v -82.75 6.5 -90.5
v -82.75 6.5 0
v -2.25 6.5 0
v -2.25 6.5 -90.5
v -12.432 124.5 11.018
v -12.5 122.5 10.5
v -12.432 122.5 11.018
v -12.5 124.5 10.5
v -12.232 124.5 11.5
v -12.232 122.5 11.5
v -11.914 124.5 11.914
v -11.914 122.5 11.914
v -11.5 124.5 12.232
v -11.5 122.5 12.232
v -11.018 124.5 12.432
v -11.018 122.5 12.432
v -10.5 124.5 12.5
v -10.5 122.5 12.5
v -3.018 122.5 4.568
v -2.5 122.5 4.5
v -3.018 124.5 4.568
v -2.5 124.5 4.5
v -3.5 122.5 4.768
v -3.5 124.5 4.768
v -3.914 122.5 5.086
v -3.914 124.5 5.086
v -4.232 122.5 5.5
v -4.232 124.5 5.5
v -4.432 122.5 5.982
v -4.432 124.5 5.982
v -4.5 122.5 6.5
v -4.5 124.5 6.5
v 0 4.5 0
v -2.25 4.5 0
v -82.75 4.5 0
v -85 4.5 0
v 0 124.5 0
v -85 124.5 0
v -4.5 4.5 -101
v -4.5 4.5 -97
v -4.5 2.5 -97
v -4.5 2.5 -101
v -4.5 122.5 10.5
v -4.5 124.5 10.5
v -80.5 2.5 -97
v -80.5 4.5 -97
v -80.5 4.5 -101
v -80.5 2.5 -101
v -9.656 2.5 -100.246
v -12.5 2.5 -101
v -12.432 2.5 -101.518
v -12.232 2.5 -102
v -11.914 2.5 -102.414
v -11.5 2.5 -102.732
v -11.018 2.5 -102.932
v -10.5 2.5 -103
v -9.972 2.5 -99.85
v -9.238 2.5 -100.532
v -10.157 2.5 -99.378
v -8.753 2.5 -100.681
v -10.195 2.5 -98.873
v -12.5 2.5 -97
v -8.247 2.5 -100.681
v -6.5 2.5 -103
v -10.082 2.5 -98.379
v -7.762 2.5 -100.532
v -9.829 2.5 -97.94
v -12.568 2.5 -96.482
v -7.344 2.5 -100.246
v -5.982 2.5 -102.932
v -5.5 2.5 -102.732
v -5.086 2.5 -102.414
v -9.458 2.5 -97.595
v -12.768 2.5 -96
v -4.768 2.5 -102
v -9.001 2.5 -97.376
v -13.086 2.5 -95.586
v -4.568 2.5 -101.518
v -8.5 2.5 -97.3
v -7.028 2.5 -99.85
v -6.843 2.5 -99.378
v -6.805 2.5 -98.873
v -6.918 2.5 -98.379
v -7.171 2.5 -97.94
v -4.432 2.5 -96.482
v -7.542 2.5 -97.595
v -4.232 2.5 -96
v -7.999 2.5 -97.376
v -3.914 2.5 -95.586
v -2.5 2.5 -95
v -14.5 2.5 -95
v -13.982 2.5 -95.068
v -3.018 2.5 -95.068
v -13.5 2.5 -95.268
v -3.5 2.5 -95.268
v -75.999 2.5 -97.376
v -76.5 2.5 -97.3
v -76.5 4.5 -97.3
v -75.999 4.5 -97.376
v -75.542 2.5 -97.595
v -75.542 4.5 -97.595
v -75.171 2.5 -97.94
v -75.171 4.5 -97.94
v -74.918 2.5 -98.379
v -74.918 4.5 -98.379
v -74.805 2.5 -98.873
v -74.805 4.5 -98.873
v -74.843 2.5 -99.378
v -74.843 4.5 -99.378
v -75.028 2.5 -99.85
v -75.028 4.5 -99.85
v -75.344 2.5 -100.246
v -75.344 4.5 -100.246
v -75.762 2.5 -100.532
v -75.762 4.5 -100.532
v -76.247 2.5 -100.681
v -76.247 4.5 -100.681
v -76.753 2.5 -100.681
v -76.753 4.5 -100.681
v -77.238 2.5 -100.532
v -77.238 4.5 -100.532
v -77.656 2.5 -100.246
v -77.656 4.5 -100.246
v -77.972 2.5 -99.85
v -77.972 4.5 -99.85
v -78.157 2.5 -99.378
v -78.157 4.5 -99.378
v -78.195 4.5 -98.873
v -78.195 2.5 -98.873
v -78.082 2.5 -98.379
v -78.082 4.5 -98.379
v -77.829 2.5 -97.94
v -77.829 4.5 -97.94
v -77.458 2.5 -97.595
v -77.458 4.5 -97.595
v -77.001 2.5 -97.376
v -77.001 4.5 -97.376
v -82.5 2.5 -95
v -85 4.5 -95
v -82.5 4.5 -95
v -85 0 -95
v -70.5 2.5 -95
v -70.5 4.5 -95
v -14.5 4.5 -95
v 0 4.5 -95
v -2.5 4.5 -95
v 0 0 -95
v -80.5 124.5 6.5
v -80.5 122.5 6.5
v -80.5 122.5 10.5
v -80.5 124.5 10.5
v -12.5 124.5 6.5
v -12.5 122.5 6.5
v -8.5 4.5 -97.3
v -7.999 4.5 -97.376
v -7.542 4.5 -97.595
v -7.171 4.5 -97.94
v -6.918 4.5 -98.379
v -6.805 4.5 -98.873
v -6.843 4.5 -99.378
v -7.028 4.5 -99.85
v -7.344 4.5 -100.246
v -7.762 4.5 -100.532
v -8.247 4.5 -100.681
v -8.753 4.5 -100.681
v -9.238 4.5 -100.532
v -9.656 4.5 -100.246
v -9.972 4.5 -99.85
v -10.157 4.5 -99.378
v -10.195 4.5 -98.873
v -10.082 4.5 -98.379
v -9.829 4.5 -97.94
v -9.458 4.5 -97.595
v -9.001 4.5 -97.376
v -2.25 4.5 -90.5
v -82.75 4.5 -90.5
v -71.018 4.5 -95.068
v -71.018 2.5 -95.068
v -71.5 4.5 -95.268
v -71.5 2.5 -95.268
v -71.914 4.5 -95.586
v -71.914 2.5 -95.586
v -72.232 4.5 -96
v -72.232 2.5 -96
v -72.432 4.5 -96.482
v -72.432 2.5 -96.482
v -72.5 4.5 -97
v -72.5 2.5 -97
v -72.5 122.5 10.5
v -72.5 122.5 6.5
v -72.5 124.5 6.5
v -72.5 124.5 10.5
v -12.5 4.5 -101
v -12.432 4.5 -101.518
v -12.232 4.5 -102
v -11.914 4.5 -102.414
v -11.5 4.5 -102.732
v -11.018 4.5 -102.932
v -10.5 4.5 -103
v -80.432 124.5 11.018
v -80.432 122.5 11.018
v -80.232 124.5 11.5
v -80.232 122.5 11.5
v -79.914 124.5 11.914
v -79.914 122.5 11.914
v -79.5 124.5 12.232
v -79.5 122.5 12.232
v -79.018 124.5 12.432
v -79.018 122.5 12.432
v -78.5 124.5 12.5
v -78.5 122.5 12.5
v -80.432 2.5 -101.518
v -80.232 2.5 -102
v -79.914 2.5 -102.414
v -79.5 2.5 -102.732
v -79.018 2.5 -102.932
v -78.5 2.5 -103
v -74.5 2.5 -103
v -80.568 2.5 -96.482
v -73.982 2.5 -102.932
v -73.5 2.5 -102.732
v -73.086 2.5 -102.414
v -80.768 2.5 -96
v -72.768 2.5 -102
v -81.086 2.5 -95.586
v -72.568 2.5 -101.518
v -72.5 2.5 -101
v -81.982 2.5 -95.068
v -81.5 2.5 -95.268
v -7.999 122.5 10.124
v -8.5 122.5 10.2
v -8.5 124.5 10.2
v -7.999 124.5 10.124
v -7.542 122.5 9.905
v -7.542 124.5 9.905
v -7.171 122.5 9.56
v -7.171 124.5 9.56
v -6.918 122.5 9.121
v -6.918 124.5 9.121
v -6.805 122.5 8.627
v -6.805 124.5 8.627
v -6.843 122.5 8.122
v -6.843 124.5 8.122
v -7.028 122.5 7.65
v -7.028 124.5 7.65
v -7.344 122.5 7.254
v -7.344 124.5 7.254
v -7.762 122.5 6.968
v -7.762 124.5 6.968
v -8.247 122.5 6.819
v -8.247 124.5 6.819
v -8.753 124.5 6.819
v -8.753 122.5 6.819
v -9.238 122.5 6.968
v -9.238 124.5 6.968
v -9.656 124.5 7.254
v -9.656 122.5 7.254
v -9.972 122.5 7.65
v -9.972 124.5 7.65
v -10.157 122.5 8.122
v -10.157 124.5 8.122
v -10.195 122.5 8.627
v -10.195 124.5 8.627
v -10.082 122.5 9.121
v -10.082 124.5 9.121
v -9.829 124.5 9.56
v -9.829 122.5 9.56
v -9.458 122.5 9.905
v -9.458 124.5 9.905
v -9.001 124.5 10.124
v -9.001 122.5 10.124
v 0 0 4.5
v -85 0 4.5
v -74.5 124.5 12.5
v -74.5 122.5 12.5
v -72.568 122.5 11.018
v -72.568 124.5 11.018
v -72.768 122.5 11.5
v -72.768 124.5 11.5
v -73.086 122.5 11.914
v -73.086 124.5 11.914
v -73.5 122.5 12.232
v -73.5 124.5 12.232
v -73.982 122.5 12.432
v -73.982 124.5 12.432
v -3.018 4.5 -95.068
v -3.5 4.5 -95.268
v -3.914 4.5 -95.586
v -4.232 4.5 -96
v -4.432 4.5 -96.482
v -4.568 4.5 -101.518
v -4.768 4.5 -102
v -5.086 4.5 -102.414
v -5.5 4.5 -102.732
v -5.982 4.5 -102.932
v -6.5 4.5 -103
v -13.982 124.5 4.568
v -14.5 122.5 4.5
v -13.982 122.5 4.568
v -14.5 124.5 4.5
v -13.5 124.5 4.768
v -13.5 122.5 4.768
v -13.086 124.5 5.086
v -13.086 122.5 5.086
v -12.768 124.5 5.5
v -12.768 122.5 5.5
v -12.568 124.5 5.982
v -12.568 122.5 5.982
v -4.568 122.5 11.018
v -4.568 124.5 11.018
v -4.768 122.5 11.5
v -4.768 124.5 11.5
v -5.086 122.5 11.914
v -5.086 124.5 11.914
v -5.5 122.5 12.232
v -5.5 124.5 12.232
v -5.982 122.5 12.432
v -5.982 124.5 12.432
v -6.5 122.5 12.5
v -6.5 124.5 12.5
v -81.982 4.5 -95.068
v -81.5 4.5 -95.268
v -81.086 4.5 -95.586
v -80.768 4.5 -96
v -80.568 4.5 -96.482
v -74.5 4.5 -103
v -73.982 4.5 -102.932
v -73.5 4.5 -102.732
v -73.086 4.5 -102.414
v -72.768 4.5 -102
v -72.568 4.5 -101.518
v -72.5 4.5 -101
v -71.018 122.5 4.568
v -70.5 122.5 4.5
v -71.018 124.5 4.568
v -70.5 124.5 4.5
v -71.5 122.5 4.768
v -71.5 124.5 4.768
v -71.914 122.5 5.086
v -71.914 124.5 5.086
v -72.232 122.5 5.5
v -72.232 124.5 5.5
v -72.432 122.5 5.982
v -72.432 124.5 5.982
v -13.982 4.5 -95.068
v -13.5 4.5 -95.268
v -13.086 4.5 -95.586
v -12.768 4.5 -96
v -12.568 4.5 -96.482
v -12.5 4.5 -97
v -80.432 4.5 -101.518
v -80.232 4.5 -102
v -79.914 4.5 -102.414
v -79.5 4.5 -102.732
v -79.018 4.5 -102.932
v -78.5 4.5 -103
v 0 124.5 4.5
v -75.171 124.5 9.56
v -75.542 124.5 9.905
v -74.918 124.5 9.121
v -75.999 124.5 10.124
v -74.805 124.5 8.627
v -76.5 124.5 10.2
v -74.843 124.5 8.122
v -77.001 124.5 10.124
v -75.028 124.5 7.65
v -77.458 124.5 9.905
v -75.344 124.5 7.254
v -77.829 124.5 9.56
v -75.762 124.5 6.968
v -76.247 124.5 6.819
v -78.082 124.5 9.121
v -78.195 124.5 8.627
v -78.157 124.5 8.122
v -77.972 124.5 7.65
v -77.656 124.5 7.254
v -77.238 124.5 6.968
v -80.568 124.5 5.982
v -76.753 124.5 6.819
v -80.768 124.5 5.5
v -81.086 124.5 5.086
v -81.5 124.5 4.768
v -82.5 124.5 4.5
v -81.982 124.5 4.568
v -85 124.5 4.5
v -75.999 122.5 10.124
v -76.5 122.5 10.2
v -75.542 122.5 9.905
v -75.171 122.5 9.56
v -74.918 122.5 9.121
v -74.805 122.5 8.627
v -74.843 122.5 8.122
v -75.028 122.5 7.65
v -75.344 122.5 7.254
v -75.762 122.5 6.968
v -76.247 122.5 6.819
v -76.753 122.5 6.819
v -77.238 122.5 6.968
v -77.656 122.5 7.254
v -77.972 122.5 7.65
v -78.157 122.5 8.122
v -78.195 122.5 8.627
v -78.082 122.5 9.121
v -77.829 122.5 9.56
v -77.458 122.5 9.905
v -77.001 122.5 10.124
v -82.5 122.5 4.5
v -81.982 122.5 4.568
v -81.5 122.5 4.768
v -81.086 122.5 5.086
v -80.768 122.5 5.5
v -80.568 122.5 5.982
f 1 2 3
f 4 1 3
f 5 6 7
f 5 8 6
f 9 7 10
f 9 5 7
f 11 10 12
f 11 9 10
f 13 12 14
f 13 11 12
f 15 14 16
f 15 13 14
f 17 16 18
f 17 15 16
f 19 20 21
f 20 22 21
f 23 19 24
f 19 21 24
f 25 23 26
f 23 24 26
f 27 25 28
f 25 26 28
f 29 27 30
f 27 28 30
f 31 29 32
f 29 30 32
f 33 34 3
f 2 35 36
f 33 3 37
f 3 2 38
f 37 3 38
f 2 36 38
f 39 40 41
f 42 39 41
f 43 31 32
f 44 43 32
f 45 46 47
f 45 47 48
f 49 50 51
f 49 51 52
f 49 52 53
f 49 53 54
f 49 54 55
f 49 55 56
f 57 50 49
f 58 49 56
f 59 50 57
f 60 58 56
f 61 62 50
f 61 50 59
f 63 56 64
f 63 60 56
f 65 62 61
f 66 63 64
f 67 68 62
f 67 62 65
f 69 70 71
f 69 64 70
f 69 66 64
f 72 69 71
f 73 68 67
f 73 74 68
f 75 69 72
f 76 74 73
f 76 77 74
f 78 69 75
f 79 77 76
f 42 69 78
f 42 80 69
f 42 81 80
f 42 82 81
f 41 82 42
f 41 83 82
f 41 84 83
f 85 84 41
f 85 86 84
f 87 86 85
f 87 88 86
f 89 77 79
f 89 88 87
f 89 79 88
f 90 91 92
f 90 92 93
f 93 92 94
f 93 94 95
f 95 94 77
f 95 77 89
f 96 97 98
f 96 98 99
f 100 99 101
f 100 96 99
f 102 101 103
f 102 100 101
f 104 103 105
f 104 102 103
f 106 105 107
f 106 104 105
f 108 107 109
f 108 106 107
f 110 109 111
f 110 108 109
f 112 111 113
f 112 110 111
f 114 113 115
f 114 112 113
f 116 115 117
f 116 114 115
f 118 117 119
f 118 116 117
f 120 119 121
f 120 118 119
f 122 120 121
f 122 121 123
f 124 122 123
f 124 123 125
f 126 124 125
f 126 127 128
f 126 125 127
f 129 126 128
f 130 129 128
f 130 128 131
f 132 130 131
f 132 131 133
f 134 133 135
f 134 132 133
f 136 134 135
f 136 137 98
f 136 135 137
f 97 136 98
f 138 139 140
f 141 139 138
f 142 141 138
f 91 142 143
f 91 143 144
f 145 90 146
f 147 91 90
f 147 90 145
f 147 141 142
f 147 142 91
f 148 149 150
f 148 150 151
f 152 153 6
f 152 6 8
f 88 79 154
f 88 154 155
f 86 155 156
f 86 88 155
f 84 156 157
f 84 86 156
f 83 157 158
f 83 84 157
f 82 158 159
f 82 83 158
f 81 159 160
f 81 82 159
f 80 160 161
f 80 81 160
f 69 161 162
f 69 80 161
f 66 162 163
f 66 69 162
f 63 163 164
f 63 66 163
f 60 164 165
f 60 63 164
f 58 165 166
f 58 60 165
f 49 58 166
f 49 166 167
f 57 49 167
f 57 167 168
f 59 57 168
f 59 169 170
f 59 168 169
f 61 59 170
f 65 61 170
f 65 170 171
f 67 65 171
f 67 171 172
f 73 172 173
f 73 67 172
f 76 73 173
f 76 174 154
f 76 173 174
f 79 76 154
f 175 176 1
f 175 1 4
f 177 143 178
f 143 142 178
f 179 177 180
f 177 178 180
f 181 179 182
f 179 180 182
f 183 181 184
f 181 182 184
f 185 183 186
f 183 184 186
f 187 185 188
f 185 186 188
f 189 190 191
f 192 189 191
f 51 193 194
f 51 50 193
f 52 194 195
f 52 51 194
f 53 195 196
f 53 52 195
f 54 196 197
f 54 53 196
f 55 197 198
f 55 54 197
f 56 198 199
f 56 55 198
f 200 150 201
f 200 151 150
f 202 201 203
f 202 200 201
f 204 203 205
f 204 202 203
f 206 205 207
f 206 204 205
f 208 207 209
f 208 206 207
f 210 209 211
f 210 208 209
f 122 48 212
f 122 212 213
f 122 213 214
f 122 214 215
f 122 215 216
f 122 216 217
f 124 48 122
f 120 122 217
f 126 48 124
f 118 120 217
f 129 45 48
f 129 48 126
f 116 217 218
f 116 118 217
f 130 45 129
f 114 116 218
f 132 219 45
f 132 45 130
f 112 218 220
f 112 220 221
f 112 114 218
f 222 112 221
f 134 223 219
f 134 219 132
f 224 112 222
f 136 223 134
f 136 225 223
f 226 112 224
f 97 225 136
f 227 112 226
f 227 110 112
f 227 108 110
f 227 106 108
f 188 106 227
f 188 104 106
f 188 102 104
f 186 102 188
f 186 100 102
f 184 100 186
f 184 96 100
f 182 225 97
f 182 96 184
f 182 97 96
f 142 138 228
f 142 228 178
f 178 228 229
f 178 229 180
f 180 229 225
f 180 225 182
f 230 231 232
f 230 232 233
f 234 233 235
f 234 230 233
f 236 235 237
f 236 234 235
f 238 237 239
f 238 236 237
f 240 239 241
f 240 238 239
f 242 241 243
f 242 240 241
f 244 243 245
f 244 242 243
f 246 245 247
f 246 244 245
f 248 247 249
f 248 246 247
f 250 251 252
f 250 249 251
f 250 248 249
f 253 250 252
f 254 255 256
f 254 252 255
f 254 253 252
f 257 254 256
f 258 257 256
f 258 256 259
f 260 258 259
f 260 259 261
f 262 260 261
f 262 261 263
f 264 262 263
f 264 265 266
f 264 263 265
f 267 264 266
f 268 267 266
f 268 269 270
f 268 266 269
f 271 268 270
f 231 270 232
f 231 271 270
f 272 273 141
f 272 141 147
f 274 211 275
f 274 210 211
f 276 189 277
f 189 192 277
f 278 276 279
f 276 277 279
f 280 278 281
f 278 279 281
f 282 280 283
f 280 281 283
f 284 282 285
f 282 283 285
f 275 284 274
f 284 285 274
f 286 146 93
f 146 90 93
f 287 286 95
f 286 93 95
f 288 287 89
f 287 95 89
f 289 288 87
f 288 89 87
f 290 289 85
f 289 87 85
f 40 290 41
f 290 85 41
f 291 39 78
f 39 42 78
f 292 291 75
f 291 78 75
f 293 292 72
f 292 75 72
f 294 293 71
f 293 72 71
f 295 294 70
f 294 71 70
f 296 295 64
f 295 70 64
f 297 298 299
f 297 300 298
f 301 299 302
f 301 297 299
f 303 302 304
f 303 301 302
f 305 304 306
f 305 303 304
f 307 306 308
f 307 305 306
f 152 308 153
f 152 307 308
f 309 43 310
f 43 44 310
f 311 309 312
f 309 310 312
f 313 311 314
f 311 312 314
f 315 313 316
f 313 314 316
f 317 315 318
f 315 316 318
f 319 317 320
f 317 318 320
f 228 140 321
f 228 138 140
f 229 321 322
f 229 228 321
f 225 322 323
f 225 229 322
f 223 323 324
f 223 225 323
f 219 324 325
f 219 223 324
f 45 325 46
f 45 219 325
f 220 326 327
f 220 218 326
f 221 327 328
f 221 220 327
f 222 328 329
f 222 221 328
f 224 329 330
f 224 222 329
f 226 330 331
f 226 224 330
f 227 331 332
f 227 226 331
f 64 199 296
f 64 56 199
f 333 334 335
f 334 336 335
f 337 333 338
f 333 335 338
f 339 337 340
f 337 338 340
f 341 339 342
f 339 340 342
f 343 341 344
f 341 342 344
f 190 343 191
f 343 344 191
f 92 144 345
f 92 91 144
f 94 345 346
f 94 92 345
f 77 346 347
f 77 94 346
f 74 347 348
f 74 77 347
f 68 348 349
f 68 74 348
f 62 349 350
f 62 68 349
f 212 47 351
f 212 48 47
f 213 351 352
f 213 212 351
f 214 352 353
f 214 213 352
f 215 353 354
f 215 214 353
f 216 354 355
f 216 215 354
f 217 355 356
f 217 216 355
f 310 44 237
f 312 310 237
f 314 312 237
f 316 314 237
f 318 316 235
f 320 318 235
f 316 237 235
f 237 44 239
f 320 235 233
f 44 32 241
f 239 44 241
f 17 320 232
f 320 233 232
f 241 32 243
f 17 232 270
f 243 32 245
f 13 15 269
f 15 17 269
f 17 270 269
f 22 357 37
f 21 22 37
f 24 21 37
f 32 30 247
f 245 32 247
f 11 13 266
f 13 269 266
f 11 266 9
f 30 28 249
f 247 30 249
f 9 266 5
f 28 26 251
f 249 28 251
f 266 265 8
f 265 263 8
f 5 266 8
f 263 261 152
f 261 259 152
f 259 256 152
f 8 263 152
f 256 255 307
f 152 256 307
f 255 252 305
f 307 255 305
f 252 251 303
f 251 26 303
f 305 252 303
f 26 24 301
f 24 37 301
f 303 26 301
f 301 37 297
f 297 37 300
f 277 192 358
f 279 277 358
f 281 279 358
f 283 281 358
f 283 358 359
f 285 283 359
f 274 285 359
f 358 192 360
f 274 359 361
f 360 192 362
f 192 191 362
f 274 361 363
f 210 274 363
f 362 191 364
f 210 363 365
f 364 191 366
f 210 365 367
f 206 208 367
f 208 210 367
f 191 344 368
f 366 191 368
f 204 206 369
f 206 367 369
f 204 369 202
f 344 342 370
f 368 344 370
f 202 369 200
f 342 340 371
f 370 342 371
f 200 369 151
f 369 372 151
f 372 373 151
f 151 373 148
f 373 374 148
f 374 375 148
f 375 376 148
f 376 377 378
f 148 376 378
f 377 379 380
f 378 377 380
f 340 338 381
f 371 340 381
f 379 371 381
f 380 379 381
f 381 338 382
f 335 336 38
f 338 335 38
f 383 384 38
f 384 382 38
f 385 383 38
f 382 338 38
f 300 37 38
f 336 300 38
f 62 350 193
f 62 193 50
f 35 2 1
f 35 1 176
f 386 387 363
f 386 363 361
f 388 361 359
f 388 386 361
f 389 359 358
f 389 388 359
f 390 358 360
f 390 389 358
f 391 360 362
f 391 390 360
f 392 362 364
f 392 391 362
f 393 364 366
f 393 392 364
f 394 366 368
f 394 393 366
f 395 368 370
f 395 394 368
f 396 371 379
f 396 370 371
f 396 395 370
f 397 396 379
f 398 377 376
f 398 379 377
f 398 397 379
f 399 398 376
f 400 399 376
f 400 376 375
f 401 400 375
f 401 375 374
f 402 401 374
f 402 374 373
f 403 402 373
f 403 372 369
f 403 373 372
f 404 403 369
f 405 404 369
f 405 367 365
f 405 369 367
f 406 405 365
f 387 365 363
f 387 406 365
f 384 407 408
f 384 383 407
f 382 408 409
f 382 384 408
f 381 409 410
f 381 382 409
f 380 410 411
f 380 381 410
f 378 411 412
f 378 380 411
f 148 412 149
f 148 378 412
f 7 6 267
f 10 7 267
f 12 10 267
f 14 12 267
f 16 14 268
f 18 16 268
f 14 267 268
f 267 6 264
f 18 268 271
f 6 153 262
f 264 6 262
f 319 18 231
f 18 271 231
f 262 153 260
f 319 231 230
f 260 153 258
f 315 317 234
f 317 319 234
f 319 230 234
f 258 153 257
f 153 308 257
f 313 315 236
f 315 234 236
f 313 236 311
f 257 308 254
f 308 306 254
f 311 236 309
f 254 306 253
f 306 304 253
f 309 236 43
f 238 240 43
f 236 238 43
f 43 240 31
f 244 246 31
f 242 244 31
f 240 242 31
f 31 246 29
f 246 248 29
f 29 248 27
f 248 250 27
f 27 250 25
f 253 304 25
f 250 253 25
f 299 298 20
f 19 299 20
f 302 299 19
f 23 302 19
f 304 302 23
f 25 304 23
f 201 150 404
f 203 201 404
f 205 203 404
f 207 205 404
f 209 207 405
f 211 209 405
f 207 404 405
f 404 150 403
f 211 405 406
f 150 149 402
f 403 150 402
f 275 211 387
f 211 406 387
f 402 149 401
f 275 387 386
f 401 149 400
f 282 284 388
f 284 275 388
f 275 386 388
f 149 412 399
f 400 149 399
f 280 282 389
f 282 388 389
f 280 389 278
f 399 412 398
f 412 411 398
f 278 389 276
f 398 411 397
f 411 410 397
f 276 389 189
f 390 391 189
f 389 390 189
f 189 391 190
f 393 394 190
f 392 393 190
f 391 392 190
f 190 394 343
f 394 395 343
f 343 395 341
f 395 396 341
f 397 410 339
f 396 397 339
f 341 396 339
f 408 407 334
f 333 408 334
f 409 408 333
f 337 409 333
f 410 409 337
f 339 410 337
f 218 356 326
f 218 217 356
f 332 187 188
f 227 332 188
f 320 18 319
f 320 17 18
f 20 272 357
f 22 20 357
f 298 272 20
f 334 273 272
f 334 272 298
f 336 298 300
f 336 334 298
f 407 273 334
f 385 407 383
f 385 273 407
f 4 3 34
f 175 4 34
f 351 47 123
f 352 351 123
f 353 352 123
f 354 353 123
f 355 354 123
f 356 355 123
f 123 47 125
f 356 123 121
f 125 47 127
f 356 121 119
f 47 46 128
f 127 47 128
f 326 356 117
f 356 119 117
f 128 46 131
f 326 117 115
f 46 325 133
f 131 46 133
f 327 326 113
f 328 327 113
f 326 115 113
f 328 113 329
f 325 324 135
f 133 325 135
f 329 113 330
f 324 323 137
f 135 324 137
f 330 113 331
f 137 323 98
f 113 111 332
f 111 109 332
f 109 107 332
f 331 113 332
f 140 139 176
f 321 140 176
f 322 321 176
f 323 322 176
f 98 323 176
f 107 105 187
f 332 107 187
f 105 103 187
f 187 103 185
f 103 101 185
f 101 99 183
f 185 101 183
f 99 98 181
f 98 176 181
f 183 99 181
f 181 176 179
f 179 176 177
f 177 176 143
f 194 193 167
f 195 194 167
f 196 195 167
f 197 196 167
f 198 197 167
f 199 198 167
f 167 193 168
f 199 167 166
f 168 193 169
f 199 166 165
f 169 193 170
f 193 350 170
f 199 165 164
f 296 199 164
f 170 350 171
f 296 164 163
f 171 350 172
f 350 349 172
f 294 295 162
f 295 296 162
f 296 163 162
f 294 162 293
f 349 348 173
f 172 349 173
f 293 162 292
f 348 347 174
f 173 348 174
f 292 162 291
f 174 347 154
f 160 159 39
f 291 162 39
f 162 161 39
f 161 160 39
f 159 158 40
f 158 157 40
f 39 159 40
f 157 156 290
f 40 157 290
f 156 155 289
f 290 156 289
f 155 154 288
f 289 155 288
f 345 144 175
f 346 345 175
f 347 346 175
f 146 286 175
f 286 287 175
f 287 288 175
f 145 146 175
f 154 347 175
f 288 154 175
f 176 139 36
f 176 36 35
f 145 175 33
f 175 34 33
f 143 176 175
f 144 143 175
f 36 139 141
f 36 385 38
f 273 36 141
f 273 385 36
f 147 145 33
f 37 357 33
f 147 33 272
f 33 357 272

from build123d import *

# Parameters (mm, degrees)
SKETCH1_W               = 124.5
SKETCH1_H               = 85
BOSS_EXTRUDE1_DEPTH     = 4.5
SKETCH2_W               = 85
SKETCH2_H               = 4.5
BOSS_EXTRUDE2_DEPTH     = 95
SKETCH3_W               = 80.5
SKETCH3_H               = 2
BOSS_EXTRUDE3_DEPTH     = 90.5
SKETCH4_W               = 8
SKETCH4_H               = 2
BOSS_EXTRUDE4_DEPTH     = 8
SKETCH5_W               = 8
SKETCH5_H               = 2
BOSS_EXTRUDE5_DEPTH     = 8
CUT_EXTRUDE1_DEPTH      = 183.576696213
CUT_EXTRUDE1_DEPTH_BACK = 183.576696213
SKETCH6_R               = 1.7
FILLET1_R               = 2


with BuildPart() as part:
    # Sketch1 → Boss-Extrude1 (new body)
    with BuildSketch(Plane(origin=(0, 0, 0), x_dir=(0, 1, 0), z_dir=(0, 0, 1))):
        with Locations((62.25, 42.5)):
            Rectangle(SKETCH1_W, SKETCH1_H)
    extrude(amount=BOSS_EXTRUDE1_DEPTH)

    # Sketch2 → Boss-Extrude2 (add)
    with BuildSketch(Plane(origin=(0, 0, 0), x_dir=(1, 0, 0), z_dir=(0, 0, -1))):
        with Locations((-42.5, -2.25)):
            Rectangle(SKETCH2_W, SKETCH2_H)
    extrude(amount=BOSS_EXTRUDE2_DEPTH)

    # Sketch3 → Boss-Extrude3 (add)
    with BuildSketch(Plane(origin=(0, 0, 0), x_dir=(1, 0, 0), z_dir=(0, 0, -1))):
        with Locations((-42.5, -5.5)):
            Rectangle(SKETCH3_W, SKETCH3_H)
    extrude(amount=BOSS_EXTRUDE3_DEPTH)

    # Sketch4 → Boss-Extrude4 (add)
    with BuildSketch(Plane.XY.offset(4.5)):
        with Locations((-76.5, 123.5)):
            Rectangle(SKETCH4_W, SKETCH4_H)
        with Locations((-8.5, 123.5)):
            Rectangle(SKETCH4_W, SKETCH4_H)
    extrude(amount=BOSS_EXTRUDE4_DEPTH)

    # Sketch5 → Boss-Extrude5 (add)
    with BuildSketch(Plane(origin=(0, 0, -95), x_dir=(1, 0, 0), z_dir=(0, 0, -1))):
        with Locations((-76.5, -3.5)):
            Rectangle(SKETCH5_W, SKETCH5_H)
        with Locations((-8.5, -3.5)):
            Rectangle(SKETCH5_W, SKETCH5_H)
    extrude(amount=BOSS_EXTRUDE5_DEPTH)

    # Sketch6 → Cut-Extrude1 (cut, two sides: drawn at the far end of the back side and taken through both)
    with BuildSketch(Plane(origin=(0, 124.5, 0), x_dir=(-1, 0, 0), z_dir=(0, 1, 0)).offset(-CUT_EXTRUDE1_DEPTH_BACK)):
        with Locations(Location((8.5, 8.5, 0), (0, 0, 90))):
            Circle(SKETCH6_R)
        with Locations(Location((76.5, 8.5, 0), (0, 0, 90))):
            Circle(SKETCH6_R)
        with Locations(Location((76.5, -99, 0), (0, 0, 90))):
            Circle(SKETCH6_R)
        with Locations(Location((8.5, -99, 0), (0, 0, 90))):
            Circle(SKETCH6_R)
    extrude(amount=CUT_EXTRUDE1_DEPTH + CUT_EXTRUDE1_DEPTH_BACK, mode=Mode.SUBTRACT)

    # Fillet1
    fillet1_edges = [part.edges().sort_by_distance(p)[0] for p in [
        (-80.5, 123.5, 4.5),
        (-72.5, 123.5, 4.5),
        (-80.5, 123.5, 12.5),
        (-72.5, 123.5, 12.5),
        (-4.5, 123.5, 4.5),
        (-12.5, 123.5, 4.5),
        (-4.5, 123.5, 12.5),
        (-12.5, 123.5, 12.5),
        (-80.5, 3.5, -95),
        (-72.5, 3.5, -95),
        (-80.5, 3.5, -103),
        (-72.5, 3.5, -103),
        (-4.5, 3.5, -95),
        (-12.5, 3.5, -95),
        (-4.5, 3.5, -103),
        (-12.5, 3.5, -103),
    ]]
    fillet(fillet1_edges, radius=FILLET1_R)


solid = part.part
